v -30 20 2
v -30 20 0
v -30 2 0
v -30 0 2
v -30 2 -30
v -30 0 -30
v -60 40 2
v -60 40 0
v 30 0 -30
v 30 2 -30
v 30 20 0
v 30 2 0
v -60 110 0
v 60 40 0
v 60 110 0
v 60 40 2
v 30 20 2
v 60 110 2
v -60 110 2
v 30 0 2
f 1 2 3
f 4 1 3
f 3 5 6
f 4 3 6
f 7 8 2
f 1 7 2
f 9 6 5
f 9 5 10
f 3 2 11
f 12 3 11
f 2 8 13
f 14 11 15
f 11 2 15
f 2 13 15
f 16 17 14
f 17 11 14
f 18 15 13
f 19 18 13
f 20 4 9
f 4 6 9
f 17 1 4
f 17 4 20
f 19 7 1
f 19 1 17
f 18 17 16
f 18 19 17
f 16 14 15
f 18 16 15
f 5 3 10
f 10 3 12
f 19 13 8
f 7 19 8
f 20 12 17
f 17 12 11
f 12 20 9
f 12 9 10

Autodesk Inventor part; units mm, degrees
ref_plane "YZ Plane" through (0, 0, 0) normal (1, 0, 0) x (0, 1, 0)
ref_plane "XZ Plane" through (0, 0, 0) normal (0, 1, 0) x (-1, 0, 0)
ref_plane "XY Plane" through (0, 0, 0) normal (0, 0, 1) x (1, 0, 0)
sketch "Sketch1" plane through (0, 0, 0) normal (0, 0, 1) x (1, 0, 0)
  line L0 (60, 40) -> (60, 110)
  line L1 (60, 110) -> (-60, 110)
  line L2 (-60, 110) -> (-60, 40)
  line L3 (-30, 0) -> (30, 0)
  line L4 (30, 0) -> (30, 20)
  line L5 (-30, 20) -> (-30, 0)
  line L6 (-60, 40) -> (-30, 20)
  line L7 (30, 20) -> (60, 40)
  point P0 (0, 0)
  dimension "d4" = 120
  dimension "d5" = 70
  dimension "d7" = 20
  dimension "d8" = 60
extrude "Extrusion1" add sketch "Sketch1" along normal blind 2
sketch "Sketch2" plane through (-30, 0, 0) normal (0, -1, 0) x (1, 0, 0)
  line L0 (60, 0) -> (60, 2) projected
  line L1 (60, 0) -> (0, 0)
  line L2 (0, 0) -> (0, -30)
  line L3 (0, -30) -> (60, -30)
  line L4 (60, -30) -> (60, 0)
  dimension "d11" = 60
  dimension "d12" = 30
extrude "Extrusion2" add sketch "Sketch2" against normal blind 2
properties part number "Body Back"
